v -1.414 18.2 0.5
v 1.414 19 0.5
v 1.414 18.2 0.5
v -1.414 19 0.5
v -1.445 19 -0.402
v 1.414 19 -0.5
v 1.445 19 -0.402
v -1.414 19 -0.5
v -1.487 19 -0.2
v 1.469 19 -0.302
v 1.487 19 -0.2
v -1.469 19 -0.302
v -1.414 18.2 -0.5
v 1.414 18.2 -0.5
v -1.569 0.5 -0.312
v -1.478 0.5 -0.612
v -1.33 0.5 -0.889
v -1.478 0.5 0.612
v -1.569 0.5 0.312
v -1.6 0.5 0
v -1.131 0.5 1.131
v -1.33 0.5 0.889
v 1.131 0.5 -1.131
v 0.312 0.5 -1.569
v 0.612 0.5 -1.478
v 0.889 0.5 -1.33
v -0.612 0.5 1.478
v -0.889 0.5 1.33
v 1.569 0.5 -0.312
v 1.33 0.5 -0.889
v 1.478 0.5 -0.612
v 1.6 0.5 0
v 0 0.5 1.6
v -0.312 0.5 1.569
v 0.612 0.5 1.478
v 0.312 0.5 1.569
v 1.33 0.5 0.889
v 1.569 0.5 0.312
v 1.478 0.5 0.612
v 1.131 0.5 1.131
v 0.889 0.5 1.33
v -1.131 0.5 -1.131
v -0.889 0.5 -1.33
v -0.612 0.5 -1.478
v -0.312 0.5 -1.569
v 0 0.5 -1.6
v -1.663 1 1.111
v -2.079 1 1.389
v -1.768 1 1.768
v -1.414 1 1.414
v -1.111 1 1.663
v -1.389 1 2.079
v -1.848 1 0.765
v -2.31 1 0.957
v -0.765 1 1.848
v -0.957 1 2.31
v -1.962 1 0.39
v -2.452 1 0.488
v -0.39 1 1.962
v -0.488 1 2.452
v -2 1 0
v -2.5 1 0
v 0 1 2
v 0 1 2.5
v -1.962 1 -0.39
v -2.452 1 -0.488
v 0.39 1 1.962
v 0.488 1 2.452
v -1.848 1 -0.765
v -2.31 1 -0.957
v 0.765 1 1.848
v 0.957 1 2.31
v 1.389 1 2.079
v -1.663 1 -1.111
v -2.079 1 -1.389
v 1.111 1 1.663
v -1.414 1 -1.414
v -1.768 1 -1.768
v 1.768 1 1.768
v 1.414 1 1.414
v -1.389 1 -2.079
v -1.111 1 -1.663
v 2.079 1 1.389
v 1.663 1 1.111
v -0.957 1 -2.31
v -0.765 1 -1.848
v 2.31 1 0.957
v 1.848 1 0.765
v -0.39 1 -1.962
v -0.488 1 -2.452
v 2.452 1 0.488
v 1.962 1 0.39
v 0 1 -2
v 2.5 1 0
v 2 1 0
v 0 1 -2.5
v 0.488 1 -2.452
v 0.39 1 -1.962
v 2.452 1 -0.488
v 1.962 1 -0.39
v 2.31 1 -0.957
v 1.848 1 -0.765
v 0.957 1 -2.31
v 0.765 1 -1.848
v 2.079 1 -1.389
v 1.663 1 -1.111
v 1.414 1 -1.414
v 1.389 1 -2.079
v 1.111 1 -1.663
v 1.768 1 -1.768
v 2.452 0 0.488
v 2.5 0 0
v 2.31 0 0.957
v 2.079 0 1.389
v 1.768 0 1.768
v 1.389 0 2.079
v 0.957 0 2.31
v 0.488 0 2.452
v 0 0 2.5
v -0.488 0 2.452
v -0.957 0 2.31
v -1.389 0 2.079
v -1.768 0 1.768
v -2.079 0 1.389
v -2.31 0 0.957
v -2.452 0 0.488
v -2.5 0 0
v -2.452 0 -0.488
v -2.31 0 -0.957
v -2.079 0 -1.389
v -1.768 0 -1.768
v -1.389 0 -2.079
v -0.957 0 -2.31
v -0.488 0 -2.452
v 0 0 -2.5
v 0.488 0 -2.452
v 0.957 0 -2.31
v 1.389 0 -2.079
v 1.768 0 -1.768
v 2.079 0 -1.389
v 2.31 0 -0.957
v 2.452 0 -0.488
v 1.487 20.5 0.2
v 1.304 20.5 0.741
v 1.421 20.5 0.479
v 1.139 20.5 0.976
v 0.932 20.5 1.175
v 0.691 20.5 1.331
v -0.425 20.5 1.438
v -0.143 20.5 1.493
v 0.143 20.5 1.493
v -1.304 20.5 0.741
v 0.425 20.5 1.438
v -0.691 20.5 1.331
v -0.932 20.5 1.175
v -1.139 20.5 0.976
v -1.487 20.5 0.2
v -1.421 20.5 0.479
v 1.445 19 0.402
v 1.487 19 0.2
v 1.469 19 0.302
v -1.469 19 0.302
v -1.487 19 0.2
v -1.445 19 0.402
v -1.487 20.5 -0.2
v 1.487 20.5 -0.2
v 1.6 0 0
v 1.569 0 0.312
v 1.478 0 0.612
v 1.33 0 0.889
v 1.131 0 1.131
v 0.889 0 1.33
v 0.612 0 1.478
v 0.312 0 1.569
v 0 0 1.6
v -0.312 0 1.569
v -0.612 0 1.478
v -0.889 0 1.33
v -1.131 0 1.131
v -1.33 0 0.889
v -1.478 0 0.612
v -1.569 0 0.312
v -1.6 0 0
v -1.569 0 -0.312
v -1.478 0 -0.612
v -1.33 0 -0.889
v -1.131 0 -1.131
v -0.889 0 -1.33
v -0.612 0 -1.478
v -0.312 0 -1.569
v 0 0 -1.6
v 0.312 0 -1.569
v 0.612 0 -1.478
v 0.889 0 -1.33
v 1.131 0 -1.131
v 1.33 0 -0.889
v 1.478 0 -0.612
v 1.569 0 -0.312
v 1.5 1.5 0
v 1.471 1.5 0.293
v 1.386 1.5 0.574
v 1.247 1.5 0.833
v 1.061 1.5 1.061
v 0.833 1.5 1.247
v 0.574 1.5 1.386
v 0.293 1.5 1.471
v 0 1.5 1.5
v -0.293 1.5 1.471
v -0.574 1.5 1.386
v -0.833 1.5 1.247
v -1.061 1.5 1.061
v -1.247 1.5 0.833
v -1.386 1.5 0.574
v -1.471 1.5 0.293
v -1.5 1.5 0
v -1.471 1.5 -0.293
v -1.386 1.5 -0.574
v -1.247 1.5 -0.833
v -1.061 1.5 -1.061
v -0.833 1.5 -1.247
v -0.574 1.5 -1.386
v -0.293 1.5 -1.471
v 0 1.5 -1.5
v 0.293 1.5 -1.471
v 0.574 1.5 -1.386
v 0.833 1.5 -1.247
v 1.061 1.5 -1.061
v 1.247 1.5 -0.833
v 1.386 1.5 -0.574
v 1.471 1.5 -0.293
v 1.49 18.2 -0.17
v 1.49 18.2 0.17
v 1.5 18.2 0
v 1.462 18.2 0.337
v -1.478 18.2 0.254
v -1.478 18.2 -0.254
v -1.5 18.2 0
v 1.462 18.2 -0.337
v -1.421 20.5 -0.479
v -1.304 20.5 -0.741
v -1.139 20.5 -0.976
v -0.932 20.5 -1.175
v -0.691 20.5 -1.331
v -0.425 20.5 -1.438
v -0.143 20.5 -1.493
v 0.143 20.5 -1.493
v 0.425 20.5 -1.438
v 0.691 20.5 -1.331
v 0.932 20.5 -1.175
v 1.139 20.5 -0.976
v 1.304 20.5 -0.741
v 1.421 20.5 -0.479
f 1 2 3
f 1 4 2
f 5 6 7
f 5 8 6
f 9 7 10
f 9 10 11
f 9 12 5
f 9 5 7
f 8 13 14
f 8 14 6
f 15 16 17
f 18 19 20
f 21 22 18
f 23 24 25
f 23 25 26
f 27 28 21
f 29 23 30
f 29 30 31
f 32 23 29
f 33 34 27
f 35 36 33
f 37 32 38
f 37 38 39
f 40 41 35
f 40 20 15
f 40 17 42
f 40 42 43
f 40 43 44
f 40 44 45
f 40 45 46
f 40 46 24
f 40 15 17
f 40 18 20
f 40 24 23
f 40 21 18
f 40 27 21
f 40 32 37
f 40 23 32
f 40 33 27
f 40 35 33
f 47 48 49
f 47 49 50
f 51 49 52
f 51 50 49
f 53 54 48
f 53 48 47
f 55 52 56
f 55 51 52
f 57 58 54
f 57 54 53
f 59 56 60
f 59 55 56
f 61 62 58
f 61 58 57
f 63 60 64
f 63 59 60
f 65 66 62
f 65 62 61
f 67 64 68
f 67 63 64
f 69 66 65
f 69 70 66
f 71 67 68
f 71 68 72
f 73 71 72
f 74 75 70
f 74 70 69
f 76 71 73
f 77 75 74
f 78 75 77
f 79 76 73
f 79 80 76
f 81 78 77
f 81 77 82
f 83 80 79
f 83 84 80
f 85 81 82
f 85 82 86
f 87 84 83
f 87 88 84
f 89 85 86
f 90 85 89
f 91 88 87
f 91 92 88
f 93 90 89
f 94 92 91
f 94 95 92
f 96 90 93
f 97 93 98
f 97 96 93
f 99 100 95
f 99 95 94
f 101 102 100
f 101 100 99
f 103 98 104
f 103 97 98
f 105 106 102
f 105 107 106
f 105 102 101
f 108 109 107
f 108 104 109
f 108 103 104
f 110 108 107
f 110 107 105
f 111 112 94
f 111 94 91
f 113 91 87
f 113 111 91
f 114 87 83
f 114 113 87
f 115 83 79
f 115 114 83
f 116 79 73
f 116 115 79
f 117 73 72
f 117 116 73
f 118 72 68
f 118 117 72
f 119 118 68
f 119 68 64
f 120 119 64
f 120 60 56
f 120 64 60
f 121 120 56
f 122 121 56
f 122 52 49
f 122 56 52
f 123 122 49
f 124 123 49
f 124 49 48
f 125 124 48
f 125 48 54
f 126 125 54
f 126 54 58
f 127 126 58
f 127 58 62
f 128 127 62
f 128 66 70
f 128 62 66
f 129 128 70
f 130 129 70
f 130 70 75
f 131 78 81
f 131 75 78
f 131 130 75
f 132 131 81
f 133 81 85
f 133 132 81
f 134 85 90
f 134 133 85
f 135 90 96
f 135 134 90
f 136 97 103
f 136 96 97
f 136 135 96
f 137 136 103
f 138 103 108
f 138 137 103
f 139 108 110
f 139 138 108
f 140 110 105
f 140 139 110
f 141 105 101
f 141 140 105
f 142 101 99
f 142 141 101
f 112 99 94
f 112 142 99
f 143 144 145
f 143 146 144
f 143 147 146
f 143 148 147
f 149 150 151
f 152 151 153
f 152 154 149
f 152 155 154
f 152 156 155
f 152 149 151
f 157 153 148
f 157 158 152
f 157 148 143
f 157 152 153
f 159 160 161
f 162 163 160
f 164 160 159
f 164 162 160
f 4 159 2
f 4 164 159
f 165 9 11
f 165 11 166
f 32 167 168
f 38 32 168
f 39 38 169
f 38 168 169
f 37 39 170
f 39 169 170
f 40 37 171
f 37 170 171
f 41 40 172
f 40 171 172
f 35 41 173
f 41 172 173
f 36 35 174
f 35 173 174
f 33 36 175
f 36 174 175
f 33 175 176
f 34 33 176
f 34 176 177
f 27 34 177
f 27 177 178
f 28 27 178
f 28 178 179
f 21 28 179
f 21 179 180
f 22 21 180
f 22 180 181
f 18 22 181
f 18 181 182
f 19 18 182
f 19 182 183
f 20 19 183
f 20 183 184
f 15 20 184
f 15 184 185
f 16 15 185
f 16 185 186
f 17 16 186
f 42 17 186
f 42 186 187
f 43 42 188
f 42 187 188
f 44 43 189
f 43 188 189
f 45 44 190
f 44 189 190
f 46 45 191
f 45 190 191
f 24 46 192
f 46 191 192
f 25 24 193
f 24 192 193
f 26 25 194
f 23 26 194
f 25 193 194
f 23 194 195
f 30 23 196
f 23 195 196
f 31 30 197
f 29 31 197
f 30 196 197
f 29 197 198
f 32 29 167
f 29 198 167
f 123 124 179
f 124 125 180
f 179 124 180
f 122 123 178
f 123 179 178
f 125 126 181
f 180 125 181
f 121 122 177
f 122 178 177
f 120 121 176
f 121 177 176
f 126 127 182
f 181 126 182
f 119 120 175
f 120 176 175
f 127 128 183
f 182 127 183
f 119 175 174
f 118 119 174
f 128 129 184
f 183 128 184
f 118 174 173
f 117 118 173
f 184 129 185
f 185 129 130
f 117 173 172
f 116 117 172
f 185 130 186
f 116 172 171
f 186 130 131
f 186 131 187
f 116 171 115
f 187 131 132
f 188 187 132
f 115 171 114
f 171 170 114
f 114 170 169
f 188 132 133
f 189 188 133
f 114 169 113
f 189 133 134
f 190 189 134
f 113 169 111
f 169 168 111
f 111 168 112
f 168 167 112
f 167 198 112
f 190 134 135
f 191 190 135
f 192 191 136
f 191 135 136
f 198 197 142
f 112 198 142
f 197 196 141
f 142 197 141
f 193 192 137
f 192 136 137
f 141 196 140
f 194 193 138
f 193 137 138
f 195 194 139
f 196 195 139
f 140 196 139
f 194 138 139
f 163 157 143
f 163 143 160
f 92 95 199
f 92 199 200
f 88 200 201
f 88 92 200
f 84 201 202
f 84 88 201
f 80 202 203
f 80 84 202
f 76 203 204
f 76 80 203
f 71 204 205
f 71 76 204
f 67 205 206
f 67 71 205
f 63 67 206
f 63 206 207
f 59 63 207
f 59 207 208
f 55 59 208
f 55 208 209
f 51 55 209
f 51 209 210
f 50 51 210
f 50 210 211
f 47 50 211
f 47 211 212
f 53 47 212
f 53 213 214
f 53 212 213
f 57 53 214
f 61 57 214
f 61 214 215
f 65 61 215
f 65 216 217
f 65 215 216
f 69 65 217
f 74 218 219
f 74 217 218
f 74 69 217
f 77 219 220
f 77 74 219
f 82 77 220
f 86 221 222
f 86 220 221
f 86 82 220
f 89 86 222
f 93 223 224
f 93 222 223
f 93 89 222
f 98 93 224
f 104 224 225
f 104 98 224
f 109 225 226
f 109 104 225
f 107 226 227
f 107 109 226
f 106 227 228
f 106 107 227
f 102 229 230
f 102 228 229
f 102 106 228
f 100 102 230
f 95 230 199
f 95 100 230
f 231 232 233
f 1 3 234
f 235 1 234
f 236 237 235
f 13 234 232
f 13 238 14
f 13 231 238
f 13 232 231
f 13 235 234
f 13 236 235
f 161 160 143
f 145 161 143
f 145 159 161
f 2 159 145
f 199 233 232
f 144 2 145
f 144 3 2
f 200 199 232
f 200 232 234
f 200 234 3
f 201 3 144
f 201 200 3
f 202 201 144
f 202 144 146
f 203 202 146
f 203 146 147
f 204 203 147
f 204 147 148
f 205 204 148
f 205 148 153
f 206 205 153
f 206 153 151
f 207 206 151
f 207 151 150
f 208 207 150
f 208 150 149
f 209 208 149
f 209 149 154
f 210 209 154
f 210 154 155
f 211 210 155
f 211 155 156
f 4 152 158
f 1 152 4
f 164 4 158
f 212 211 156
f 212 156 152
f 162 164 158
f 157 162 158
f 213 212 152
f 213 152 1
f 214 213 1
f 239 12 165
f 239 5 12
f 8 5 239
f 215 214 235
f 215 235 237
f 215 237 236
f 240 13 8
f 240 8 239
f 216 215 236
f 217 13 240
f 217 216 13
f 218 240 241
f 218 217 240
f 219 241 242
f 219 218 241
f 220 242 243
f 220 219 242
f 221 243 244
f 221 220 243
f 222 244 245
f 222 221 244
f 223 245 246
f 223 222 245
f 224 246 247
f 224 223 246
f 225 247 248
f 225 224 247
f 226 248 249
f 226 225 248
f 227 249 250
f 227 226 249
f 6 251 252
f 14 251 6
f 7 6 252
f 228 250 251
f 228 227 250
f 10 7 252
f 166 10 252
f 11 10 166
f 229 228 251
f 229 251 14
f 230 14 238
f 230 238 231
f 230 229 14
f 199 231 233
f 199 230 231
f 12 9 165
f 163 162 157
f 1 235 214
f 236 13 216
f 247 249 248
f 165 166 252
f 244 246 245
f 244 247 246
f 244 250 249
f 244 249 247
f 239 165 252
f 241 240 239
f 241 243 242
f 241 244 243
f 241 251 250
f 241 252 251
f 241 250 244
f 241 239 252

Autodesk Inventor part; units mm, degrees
ref_plane "YZ Plane" through (0, 0, 0) normal (1, 0, 0) x (0, 1, 0)
ref_plane "XZ Plane" through (0, 0, 0) normal (0, 1, 0) x (-1, 0, 0)
ref_plane "XY Plane" through (0, 0, 0) normal (0, 0, 1) x (1, 0, 0)
sketch "Sketch1" plane through (0, 0, 0) normal (0, 0, 1) x (1, 0, 0)
  line L0 (0, 0) -> (0, 26)
  line L1 (0, 26) -> (1.5, 26)
  line L2 (1.5, 26) -> (1.5, 1)
  line L3 (1.5, 1) -> (2.5, 1)
  line L4 (2.5, 1) -> (2.5, 0)
  line L5 (2.5, 0) -> (0, 0)
  line L6 (1.5, 26) -> (4, 26)
  line L7 (4, 26) -> (4, 24)
  line L8 (4, 24) -> (1.5, 24)
  line L9 (1.5, 24) -> (1.5, 26)
  point P0 (1.5, 24)
  dimension "d0" = 2.5
  dimension "d1" = 1.5
  dimension "d2" = 1
  dimension "d3" = 26
  dimension "d5" = 2
  dimension "d6" = 4
revolve "Revolution1" add sketch "Sketch1" angle 360 about axis through (0, 0, 0) along (0, 1, 0) contours L0 L1 L2 L3 L4 L5
sketch "Sketch2" plane through (0, 0, 0) normal (0, -1, 0) x (1, 0, 0)
  circle A0 centre (0, 0) radius 1.6
  dimension "d10" = 3.2
extrude "Extrusion1" cut sketch "Sketch2" against normal blind 0.5
chamfer "Chamfer1" distance 0.5 angle 45 1 edges at (-1.5, 1, 0)
sketch "Sketch3" plane through (0, 0, 0) normal (1, 0, 0) x (0, 1, 0)
  line L0 (1.5, 1.5) -> (26, 1.5) projected
  line L1 (20.5, 1.5) -> (20.5, 0.2)
  line L2 (20.5, 0.2) -> (19, 0.2)
  line L3 (19, 0.2) -> (19, 0.5)
  line L4 (19, 0.5) -> (18.2, 0.5)
  line L5 (18.2, 0.5) -> (18.2, -0.5)
  line L6 (18.2, -0.5) -> (19, -0.5)
  line L7 (19, -0.5) -> (19, -0.2)
  line L8 (19, -0.2) -> (20.5, -0.2)
  line L9 (20.5, -0.2) -> (20.5, -1.5)
  line L10 (1.5, -1.5) -> (26, -1.5) projected
  line L11 (26, 0) -> (62.914, 0) construction
  line L12 (20.5, 1.5) -> (26, 1.5)
  line L13 (1.5, 1.5) -> (26, 1.5) projected
  line L14 (26, -1.5) -> (26, 1.5) projected
  line L15 (26, -1.5) -> (26, 1.5)
  line L16 (26, 1.5) -> (26, -1.5)
  line L17 (20.5, -1.5) -> (26, -1.5)
  line L18 (26, 0) -> (18.2, 0) construction
  point P0 (0, 0)
  dimension "d16" = 0.4
  dimension "d17" = 1.5
  dimension "d18" = 0.8
  dimension "d19" = 1
  dimension "d23" = 5.5
  dimension "d24" = 1.3
extrude "Extrusion2" cut sketch "Sketch3" along normal mid plane 10
properties part number "Taster"
